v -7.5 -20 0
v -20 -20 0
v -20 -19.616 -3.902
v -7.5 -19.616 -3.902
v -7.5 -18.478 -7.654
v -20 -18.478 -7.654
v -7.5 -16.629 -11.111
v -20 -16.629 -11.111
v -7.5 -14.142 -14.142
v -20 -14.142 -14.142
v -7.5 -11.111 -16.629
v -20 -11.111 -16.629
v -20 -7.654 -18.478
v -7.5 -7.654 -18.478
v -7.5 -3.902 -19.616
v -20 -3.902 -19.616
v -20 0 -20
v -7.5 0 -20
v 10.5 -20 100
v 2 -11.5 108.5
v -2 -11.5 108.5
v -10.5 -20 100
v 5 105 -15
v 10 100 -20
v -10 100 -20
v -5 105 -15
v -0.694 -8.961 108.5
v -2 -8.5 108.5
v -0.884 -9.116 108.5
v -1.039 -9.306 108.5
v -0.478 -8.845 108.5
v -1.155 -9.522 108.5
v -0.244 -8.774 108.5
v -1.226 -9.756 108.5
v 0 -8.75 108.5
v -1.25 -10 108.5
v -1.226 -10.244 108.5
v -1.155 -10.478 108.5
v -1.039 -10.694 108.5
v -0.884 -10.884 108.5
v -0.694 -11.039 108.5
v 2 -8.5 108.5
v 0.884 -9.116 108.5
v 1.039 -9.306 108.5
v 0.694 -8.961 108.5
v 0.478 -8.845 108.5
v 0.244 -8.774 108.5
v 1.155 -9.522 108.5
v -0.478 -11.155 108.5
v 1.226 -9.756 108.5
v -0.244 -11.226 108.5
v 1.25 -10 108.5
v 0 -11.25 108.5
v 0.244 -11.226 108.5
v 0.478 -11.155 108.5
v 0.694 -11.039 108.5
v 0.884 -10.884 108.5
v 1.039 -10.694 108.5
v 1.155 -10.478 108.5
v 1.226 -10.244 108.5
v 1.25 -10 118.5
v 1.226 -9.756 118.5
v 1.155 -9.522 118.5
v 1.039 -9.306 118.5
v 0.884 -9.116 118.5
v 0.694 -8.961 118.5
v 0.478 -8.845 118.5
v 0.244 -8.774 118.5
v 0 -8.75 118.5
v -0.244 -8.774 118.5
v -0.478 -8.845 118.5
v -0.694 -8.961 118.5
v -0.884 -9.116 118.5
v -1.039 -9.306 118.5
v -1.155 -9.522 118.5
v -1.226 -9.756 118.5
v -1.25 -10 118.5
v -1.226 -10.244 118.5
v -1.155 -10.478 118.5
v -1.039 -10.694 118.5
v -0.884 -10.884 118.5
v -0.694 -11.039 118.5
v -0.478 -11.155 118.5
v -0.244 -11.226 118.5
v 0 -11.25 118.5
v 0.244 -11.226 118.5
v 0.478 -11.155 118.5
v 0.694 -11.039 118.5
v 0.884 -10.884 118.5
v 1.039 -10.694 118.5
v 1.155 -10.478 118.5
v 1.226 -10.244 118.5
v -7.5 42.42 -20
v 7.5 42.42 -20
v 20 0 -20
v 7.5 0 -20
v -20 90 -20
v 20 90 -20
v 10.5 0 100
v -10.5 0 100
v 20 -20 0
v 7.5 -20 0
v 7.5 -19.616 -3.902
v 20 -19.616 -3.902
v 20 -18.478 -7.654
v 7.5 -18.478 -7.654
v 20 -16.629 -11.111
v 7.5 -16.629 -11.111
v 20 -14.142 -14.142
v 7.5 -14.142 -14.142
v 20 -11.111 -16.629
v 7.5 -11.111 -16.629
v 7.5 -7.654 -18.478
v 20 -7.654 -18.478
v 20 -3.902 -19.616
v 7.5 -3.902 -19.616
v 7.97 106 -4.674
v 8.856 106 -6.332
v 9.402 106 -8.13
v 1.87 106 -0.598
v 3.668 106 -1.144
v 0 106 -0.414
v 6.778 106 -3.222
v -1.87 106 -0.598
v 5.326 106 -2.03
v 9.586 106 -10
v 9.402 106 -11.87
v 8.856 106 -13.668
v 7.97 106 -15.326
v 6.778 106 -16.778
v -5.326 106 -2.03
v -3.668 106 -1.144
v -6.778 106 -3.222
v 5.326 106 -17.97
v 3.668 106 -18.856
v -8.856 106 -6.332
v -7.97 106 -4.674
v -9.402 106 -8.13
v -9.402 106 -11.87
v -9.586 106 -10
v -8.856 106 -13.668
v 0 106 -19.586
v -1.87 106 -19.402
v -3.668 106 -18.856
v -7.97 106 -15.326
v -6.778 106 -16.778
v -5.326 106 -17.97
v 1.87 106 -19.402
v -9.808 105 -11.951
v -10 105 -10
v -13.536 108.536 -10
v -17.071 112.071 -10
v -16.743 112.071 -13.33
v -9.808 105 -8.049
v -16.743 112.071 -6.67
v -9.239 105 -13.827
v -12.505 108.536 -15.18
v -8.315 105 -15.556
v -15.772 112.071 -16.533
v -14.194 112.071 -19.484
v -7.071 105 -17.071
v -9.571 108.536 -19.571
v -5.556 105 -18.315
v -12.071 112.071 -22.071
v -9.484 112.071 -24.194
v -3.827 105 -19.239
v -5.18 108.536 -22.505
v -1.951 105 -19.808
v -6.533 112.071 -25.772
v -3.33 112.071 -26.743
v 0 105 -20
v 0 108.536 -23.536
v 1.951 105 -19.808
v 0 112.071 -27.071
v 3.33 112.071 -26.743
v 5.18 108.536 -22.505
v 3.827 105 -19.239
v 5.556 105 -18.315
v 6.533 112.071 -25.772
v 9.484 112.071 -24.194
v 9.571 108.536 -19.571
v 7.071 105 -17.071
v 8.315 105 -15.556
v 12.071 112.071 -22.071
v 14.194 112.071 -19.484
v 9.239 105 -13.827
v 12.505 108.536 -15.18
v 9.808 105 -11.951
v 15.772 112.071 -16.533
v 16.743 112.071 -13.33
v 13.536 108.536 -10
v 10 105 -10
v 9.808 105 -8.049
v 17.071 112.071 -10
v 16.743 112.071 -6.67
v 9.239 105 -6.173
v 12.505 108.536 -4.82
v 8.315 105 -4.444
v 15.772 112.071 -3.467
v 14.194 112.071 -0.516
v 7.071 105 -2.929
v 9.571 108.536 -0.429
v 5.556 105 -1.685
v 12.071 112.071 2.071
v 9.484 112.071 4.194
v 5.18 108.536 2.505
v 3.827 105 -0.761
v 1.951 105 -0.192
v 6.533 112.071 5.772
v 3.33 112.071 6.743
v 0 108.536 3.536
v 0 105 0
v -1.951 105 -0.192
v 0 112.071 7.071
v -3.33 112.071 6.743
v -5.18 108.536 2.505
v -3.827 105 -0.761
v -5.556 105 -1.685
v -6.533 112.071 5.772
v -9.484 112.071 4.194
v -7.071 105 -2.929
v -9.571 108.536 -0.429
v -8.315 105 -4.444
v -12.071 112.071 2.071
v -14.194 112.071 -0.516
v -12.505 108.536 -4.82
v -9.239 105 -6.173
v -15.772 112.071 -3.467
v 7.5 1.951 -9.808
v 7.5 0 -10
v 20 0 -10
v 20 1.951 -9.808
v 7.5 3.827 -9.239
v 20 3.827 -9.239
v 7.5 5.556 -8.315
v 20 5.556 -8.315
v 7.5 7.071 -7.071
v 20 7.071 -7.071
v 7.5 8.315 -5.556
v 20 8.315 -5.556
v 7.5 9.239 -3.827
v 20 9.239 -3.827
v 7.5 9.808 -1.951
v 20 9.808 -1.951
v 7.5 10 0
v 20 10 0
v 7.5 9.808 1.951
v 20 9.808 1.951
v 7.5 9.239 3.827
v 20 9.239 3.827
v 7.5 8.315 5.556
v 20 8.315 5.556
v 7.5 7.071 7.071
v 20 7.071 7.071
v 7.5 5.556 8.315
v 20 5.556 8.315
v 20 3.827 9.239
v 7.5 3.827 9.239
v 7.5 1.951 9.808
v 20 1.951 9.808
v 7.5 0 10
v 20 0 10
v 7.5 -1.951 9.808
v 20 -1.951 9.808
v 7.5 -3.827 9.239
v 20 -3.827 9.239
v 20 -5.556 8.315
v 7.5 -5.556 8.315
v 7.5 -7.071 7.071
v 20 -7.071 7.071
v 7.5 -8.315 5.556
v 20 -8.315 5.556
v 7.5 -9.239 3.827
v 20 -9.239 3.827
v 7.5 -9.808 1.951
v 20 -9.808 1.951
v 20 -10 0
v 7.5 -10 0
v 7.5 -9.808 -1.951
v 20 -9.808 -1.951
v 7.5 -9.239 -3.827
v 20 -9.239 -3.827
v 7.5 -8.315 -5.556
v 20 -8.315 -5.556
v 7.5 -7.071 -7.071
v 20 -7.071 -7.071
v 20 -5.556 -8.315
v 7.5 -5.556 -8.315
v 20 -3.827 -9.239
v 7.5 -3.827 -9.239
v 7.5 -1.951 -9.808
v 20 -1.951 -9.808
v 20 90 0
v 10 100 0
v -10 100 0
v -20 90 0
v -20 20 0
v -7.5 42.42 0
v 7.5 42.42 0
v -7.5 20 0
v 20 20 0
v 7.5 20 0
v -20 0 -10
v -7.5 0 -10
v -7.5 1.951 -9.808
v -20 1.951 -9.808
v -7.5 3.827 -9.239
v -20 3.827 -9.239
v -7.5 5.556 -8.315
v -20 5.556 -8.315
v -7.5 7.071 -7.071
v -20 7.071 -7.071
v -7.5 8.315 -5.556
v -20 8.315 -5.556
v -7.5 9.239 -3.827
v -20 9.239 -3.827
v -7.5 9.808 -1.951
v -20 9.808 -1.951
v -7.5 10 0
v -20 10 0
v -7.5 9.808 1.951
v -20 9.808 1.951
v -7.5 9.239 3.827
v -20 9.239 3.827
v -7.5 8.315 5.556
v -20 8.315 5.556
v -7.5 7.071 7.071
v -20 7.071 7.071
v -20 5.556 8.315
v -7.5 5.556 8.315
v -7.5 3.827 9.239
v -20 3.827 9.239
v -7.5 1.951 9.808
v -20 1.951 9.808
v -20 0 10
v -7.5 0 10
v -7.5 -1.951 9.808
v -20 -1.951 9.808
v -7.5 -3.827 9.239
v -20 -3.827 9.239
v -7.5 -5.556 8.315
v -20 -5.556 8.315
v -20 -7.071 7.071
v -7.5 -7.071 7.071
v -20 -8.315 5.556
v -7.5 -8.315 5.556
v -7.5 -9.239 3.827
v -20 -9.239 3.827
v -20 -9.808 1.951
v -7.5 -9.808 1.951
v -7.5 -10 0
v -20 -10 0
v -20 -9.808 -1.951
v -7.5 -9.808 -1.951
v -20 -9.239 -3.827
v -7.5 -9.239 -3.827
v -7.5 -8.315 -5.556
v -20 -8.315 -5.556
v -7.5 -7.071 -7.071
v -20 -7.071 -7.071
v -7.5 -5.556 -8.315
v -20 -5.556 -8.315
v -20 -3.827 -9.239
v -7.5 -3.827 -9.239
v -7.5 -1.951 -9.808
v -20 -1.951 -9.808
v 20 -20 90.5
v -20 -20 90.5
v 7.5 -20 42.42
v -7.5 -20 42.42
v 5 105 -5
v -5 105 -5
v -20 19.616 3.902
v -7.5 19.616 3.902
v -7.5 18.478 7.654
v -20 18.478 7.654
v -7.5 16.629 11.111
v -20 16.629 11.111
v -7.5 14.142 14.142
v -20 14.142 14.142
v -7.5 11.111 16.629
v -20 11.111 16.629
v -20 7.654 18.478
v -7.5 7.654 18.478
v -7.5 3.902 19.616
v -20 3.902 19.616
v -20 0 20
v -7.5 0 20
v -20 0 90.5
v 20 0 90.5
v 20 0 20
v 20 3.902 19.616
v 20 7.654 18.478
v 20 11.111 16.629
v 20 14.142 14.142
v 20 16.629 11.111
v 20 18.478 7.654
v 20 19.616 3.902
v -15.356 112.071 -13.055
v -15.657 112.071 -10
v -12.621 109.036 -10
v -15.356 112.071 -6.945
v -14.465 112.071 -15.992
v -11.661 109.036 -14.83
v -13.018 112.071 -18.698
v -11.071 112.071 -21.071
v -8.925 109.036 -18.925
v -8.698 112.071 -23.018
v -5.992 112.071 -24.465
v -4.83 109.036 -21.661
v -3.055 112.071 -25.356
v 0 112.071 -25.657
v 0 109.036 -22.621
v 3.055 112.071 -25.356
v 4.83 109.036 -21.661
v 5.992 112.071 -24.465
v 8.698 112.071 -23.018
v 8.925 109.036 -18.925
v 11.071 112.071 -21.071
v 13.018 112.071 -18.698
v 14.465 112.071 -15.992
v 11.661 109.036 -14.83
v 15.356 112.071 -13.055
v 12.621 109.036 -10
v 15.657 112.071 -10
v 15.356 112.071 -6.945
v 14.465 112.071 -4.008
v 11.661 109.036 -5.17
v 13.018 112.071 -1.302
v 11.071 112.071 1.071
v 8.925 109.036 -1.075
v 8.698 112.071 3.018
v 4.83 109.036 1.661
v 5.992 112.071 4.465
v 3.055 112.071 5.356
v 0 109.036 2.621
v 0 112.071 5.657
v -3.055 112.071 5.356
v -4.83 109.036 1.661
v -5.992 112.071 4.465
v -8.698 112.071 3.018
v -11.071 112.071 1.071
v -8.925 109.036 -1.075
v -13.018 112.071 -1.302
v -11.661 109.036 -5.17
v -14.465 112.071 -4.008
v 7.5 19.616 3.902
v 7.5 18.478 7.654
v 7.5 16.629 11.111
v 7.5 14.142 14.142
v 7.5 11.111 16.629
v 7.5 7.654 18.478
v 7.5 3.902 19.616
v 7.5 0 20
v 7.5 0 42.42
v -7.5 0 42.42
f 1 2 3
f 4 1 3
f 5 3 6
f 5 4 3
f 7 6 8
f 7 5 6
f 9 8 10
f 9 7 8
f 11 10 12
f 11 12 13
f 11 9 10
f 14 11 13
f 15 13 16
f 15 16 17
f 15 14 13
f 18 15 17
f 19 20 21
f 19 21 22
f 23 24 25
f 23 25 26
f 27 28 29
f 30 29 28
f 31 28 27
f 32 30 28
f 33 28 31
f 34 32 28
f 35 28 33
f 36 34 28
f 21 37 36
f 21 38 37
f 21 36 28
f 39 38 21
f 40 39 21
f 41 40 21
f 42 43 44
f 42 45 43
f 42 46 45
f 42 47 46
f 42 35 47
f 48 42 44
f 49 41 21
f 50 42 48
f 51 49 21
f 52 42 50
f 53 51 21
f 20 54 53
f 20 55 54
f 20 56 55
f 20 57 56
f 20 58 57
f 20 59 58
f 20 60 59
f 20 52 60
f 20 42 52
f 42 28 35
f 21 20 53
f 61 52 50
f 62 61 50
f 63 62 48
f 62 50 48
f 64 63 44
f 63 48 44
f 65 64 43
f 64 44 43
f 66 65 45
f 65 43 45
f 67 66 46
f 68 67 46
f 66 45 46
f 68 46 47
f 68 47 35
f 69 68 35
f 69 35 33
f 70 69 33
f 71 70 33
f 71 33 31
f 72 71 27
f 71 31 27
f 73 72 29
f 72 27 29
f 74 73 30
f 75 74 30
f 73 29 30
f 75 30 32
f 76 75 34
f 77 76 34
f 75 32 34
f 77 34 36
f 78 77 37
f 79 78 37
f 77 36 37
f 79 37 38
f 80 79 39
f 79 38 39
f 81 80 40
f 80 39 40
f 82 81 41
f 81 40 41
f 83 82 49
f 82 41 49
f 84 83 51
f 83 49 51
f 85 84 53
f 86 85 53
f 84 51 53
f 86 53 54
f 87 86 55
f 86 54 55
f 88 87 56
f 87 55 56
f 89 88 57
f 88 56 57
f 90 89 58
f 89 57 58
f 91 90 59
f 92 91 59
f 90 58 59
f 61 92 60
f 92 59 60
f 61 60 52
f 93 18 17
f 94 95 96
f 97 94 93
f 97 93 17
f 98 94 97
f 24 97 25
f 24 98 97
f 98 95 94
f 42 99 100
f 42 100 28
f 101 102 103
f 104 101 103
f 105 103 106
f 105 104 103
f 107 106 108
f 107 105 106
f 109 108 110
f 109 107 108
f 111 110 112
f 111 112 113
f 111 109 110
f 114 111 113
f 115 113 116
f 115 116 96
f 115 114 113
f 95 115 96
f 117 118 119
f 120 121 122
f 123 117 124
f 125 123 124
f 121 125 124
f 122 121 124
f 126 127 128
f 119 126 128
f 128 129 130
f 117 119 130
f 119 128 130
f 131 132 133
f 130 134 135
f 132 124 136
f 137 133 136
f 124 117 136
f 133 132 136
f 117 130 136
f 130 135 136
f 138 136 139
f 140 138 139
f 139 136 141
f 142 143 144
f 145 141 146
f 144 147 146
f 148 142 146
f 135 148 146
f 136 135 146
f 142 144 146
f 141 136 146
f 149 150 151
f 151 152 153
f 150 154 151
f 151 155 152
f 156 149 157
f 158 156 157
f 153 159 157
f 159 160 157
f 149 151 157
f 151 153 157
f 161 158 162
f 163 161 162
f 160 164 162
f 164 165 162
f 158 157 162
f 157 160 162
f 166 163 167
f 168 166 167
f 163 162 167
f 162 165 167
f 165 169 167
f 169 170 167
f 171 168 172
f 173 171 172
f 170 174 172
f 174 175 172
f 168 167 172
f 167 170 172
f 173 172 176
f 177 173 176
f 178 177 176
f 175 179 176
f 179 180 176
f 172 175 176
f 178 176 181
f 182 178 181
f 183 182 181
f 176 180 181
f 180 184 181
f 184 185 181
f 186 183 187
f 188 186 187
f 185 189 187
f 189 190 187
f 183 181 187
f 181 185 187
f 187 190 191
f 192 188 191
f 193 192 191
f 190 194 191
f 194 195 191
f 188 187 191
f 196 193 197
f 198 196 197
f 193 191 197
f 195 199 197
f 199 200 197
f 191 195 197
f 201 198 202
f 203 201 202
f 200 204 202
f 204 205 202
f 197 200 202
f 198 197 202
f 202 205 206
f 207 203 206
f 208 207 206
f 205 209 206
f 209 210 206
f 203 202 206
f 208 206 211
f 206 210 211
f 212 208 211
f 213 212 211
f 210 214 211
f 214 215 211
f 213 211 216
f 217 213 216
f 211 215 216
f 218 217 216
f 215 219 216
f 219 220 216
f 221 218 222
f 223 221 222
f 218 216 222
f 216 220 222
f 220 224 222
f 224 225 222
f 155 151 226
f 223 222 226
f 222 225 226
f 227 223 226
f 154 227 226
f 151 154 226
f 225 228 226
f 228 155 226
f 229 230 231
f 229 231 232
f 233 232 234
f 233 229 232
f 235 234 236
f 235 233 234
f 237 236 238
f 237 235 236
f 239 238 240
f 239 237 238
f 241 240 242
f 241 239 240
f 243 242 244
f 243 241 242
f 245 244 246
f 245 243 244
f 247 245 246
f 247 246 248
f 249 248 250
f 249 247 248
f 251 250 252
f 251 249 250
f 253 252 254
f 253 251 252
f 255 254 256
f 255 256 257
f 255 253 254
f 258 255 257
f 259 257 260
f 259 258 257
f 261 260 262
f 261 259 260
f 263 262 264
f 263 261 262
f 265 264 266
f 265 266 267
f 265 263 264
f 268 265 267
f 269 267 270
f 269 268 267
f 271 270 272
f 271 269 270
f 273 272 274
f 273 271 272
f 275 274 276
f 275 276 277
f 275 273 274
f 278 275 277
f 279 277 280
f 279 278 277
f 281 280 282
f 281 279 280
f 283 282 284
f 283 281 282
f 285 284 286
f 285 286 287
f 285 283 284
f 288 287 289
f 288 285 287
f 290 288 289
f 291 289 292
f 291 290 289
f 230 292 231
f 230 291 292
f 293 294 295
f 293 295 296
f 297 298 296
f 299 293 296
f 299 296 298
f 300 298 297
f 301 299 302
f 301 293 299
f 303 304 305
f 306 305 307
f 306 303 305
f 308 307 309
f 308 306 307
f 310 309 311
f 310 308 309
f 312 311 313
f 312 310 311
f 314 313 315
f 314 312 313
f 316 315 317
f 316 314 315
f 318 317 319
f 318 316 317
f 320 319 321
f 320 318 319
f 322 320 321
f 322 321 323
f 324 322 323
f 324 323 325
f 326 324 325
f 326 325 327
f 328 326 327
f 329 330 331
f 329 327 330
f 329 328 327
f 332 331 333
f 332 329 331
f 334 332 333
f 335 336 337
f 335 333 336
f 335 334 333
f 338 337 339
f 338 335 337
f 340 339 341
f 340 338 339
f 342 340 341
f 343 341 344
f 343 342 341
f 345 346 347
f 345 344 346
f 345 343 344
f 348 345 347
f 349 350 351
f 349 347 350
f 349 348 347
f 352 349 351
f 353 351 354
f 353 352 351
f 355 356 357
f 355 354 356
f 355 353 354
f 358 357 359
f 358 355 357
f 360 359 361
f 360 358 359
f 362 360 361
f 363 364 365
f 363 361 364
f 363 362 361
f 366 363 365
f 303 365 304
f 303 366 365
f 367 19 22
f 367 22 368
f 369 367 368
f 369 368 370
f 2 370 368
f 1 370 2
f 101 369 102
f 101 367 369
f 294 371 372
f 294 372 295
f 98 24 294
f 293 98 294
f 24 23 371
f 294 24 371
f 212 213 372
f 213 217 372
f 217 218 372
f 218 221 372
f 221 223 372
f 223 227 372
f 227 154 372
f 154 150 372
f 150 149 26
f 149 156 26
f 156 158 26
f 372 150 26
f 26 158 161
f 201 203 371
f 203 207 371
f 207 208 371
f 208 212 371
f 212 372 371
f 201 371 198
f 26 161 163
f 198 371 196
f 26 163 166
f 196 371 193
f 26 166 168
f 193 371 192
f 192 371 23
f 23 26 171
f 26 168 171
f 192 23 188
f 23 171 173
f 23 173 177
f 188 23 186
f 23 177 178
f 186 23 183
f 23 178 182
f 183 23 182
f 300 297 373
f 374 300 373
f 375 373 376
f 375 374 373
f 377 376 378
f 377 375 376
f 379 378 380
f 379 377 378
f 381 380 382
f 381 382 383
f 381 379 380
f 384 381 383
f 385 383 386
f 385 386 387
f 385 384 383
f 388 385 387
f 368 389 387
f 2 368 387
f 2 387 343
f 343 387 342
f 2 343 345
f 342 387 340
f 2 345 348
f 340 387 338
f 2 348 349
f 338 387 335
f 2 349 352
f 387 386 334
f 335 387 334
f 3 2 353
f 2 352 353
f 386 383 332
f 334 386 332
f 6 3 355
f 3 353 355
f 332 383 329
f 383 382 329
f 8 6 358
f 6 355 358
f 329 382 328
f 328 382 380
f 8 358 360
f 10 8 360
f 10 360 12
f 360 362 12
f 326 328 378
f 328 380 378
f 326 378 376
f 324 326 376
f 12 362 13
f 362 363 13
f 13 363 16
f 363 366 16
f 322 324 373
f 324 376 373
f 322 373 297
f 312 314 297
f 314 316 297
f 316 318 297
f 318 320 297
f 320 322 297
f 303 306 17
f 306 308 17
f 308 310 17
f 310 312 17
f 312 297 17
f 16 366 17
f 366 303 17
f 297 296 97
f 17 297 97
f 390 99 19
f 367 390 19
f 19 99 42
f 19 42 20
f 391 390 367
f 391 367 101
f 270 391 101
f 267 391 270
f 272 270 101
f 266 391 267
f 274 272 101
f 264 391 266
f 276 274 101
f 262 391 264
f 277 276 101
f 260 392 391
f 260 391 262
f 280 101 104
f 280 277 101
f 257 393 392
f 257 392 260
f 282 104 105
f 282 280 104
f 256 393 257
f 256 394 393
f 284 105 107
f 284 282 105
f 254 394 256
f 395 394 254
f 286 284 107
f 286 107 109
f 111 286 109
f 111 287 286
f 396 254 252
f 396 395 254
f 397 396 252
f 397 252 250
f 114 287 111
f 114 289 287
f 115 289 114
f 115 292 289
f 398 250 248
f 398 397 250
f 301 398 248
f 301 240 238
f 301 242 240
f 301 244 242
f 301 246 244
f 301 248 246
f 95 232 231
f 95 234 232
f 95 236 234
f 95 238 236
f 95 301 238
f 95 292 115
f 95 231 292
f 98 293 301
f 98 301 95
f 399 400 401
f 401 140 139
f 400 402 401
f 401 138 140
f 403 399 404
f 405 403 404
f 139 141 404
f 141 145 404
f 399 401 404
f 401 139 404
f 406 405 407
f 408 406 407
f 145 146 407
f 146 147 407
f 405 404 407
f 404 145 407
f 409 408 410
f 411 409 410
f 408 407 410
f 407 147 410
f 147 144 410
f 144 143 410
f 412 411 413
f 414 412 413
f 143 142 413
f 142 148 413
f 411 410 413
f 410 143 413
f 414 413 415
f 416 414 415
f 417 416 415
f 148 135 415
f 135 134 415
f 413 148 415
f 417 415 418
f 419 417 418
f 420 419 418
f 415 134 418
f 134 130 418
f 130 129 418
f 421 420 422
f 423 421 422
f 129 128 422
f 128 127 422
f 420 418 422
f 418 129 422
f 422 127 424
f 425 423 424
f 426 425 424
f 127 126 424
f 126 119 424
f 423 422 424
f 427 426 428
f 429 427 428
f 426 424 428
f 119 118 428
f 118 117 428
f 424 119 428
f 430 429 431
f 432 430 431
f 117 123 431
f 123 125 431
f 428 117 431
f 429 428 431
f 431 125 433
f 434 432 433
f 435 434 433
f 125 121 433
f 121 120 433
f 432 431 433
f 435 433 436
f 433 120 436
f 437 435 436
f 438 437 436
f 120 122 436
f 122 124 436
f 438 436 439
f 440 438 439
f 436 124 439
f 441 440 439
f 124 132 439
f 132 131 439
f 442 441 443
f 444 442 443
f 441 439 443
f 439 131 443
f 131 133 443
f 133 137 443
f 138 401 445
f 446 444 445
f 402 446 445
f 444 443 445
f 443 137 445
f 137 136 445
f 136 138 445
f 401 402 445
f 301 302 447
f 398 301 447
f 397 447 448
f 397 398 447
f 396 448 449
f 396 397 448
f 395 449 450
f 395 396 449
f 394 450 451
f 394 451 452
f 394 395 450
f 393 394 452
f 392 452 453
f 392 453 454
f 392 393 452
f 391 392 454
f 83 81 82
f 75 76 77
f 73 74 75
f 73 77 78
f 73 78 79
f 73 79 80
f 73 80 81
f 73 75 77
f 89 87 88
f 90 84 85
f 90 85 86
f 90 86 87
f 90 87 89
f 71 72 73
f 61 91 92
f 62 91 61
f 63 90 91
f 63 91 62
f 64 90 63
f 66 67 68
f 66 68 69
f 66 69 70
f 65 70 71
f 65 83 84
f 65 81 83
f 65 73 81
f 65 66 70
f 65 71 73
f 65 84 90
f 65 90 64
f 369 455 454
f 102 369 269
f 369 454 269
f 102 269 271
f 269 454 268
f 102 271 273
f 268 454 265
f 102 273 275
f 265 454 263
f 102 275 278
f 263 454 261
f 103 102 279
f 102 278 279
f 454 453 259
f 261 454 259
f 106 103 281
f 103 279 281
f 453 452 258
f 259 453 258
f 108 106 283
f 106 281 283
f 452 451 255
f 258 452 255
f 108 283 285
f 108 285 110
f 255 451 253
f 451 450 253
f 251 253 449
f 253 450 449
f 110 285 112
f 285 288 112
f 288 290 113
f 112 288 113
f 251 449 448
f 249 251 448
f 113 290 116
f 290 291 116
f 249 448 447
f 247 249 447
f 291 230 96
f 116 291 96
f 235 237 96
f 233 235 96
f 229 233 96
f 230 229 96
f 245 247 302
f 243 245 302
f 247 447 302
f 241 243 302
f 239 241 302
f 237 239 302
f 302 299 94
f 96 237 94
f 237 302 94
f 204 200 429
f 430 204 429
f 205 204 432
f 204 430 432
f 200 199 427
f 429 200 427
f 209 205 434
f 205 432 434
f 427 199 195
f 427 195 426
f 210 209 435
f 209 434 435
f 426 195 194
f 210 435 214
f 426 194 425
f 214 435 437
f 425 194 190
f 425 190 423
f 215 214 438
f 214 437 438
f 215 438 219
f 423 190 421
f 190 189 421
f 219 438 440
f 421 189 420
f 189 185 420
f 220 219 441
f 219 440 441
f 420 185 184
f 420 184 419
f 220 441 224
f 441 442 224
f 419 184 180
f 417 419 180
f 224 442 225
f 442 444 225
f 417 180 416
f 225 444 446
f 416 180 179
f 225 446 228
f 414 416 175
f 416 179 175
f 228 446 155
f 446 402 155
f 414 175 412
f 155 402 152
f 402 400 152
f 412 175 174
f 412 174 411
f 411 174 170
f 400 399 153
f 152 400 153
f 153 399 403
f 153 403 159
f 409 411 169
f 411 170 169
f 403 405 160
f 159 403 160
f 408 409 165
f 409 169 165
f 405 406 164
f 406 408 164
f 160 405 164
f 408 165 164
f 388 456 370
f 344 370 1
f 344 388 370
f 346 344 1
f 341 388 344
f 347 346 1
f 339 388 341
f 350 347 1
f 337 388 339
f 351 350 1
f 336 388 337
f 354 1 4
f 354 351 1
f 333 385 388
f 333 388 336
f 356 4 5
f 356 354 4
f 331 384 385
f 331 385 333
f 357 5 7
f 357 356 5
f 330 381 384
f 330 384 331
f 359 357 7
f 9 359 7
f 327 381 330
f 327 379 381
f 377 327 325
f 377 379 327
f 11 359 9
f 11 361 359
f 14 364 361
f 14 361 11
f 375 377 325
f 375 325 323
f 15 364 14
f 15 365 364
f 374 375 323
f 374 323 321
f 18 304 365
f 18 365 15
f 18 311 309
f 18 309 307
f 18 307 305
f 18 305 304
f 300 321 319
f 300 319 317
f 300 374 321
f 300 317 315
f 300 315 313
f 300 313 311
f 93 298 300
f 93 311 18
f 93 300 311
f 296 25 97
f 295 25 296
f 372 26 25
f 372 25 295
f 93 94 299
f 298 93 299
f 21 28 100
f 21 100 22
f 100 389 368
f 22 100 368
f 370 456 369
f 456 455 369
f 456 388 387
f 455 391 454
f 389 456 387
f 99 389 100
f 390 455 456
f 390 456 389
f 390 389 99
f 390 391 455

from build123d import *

# Parameters (mm, degrees)
SKETCH1_TOOL_TIP_R  = 10
BOSS_EXTRUDE1_DEPTH = 20
CHAMFER1_SIZE       = 18
CUT_EXTRUDE1_DEPTH  = 7.5
SKETCH3_TOOL_TIP_R  = 1.25
BOSS_EXTRUDE2_DEPTH = 10
CHAMFER2_SIZE       = 15


with BuildPart() as part:
    # sketch1_tool_tip → Boss-Extrude1 (new body, symmetric)
    with BuildSketch(Plane(origin=(0, 0, 0), x_dir=(0, 0, -1), z_dir=(1, 0, 0))):
        with BuildLine():
            Line((-100, 0), (-108.5, -8.5))
            Line((-108.5, -8.5), (-108.5, -11.5))
            Line((-108.5, -11.5), (-100, -20))
            Line((-100, -20), (0, -20))
            ThreePointArc((0, -20), (14.142135624, -14.142135624), (20, 0))
            Line((20, 0), (20, 100))
            Line((20, 100), (15, 105))
            Line((15, 105), (5, 105))
            Line((5, 105), (0, 100))
            Line((0, 100), (0, 20))
            ThreePointArc((0, 20), (-14.142135624, 14.142135624), (-20, 0))
            Line((-20, 0), (-100, 0))
        make_face()
        Circle(SKETCH1_TOOL_TIP_R, mode=Mode.SUBTRACT)
    extrude(amount=BOSS_EXTRUDE1_DEPTH, both=True)

    # Chamfer1
    chamfer1_edges = [part.edges().sort_by_distance(p)[0] for p in [
        (-20, -10, 108.5),
        (20, -10, 108.5),
    ]]
    chamfer(chamfer1_edges, length=CHAMFER1_SIZE)

    # sketch2_tool_tip → Cut-Extrude1 (cut, symmetric)
    with BuildSketch(Plane(origin=(0, 0, 0), x_dir=(0, 0, -1), z_dir=(1, 0, 0))):
        with BuildLine():
            Line((-42.42, -20), (0, -20))
            ThreePointArc((0, -20), (14.142135624, -14.142135624), (20, 0))
            Line((20, 0), (20, 42.42))
            Line((20, 42.42), (0, 42.42))
            Line((0, 42.42), (0, 20))
            ThreePointArc((0, 20), (-14.142135624, 14.142135624), (-20, 0))
            Line((-20, 0), (-42.42, 0))
            Line((-42.42, 0), (-42.42, -20))
        make_face()
    extrude(amount=CUT_EXTRUDE1_DEPTH, both=True, mode=Mode.SUBTRACT)

    # sketch3_tool_tip → Boss-Extrude2 (add)
    with BuildSketch(Plane.XY.offset(108.5)):
        with Locations((0, -10)):
            Circle(SKETCH3_TOOL_TIP_R)
    extrude(amount=BOSS_EXTRUDE2_DEPTH)

    # Chamfer2
    chamfer2_edges = [part.edges().sort_by_distance(p)[0] for p in [
        (-20, 105, -10),
        (20, 105, -10),
    ]]
    chamfer(chamfer2_edges, length=CHAMFER2_SIZE)

    # sketch4_tool_tip → Revolve1 (revolve)
    with BuildSketch(Plane(origin=(0, 0, -10), x_dir=(-1, 0, 0), z_dir=(0, 0, -1))):
        Polygon((0, 105), (10, 105), (17.071067812, 112.071067812), (15.656854249, 112.071067812), (9.585786438, 106), (0, 106), align=None)
    revolve(axis=Axis((0, 105, -10), (0, -1, 0)))


solid = part.part
